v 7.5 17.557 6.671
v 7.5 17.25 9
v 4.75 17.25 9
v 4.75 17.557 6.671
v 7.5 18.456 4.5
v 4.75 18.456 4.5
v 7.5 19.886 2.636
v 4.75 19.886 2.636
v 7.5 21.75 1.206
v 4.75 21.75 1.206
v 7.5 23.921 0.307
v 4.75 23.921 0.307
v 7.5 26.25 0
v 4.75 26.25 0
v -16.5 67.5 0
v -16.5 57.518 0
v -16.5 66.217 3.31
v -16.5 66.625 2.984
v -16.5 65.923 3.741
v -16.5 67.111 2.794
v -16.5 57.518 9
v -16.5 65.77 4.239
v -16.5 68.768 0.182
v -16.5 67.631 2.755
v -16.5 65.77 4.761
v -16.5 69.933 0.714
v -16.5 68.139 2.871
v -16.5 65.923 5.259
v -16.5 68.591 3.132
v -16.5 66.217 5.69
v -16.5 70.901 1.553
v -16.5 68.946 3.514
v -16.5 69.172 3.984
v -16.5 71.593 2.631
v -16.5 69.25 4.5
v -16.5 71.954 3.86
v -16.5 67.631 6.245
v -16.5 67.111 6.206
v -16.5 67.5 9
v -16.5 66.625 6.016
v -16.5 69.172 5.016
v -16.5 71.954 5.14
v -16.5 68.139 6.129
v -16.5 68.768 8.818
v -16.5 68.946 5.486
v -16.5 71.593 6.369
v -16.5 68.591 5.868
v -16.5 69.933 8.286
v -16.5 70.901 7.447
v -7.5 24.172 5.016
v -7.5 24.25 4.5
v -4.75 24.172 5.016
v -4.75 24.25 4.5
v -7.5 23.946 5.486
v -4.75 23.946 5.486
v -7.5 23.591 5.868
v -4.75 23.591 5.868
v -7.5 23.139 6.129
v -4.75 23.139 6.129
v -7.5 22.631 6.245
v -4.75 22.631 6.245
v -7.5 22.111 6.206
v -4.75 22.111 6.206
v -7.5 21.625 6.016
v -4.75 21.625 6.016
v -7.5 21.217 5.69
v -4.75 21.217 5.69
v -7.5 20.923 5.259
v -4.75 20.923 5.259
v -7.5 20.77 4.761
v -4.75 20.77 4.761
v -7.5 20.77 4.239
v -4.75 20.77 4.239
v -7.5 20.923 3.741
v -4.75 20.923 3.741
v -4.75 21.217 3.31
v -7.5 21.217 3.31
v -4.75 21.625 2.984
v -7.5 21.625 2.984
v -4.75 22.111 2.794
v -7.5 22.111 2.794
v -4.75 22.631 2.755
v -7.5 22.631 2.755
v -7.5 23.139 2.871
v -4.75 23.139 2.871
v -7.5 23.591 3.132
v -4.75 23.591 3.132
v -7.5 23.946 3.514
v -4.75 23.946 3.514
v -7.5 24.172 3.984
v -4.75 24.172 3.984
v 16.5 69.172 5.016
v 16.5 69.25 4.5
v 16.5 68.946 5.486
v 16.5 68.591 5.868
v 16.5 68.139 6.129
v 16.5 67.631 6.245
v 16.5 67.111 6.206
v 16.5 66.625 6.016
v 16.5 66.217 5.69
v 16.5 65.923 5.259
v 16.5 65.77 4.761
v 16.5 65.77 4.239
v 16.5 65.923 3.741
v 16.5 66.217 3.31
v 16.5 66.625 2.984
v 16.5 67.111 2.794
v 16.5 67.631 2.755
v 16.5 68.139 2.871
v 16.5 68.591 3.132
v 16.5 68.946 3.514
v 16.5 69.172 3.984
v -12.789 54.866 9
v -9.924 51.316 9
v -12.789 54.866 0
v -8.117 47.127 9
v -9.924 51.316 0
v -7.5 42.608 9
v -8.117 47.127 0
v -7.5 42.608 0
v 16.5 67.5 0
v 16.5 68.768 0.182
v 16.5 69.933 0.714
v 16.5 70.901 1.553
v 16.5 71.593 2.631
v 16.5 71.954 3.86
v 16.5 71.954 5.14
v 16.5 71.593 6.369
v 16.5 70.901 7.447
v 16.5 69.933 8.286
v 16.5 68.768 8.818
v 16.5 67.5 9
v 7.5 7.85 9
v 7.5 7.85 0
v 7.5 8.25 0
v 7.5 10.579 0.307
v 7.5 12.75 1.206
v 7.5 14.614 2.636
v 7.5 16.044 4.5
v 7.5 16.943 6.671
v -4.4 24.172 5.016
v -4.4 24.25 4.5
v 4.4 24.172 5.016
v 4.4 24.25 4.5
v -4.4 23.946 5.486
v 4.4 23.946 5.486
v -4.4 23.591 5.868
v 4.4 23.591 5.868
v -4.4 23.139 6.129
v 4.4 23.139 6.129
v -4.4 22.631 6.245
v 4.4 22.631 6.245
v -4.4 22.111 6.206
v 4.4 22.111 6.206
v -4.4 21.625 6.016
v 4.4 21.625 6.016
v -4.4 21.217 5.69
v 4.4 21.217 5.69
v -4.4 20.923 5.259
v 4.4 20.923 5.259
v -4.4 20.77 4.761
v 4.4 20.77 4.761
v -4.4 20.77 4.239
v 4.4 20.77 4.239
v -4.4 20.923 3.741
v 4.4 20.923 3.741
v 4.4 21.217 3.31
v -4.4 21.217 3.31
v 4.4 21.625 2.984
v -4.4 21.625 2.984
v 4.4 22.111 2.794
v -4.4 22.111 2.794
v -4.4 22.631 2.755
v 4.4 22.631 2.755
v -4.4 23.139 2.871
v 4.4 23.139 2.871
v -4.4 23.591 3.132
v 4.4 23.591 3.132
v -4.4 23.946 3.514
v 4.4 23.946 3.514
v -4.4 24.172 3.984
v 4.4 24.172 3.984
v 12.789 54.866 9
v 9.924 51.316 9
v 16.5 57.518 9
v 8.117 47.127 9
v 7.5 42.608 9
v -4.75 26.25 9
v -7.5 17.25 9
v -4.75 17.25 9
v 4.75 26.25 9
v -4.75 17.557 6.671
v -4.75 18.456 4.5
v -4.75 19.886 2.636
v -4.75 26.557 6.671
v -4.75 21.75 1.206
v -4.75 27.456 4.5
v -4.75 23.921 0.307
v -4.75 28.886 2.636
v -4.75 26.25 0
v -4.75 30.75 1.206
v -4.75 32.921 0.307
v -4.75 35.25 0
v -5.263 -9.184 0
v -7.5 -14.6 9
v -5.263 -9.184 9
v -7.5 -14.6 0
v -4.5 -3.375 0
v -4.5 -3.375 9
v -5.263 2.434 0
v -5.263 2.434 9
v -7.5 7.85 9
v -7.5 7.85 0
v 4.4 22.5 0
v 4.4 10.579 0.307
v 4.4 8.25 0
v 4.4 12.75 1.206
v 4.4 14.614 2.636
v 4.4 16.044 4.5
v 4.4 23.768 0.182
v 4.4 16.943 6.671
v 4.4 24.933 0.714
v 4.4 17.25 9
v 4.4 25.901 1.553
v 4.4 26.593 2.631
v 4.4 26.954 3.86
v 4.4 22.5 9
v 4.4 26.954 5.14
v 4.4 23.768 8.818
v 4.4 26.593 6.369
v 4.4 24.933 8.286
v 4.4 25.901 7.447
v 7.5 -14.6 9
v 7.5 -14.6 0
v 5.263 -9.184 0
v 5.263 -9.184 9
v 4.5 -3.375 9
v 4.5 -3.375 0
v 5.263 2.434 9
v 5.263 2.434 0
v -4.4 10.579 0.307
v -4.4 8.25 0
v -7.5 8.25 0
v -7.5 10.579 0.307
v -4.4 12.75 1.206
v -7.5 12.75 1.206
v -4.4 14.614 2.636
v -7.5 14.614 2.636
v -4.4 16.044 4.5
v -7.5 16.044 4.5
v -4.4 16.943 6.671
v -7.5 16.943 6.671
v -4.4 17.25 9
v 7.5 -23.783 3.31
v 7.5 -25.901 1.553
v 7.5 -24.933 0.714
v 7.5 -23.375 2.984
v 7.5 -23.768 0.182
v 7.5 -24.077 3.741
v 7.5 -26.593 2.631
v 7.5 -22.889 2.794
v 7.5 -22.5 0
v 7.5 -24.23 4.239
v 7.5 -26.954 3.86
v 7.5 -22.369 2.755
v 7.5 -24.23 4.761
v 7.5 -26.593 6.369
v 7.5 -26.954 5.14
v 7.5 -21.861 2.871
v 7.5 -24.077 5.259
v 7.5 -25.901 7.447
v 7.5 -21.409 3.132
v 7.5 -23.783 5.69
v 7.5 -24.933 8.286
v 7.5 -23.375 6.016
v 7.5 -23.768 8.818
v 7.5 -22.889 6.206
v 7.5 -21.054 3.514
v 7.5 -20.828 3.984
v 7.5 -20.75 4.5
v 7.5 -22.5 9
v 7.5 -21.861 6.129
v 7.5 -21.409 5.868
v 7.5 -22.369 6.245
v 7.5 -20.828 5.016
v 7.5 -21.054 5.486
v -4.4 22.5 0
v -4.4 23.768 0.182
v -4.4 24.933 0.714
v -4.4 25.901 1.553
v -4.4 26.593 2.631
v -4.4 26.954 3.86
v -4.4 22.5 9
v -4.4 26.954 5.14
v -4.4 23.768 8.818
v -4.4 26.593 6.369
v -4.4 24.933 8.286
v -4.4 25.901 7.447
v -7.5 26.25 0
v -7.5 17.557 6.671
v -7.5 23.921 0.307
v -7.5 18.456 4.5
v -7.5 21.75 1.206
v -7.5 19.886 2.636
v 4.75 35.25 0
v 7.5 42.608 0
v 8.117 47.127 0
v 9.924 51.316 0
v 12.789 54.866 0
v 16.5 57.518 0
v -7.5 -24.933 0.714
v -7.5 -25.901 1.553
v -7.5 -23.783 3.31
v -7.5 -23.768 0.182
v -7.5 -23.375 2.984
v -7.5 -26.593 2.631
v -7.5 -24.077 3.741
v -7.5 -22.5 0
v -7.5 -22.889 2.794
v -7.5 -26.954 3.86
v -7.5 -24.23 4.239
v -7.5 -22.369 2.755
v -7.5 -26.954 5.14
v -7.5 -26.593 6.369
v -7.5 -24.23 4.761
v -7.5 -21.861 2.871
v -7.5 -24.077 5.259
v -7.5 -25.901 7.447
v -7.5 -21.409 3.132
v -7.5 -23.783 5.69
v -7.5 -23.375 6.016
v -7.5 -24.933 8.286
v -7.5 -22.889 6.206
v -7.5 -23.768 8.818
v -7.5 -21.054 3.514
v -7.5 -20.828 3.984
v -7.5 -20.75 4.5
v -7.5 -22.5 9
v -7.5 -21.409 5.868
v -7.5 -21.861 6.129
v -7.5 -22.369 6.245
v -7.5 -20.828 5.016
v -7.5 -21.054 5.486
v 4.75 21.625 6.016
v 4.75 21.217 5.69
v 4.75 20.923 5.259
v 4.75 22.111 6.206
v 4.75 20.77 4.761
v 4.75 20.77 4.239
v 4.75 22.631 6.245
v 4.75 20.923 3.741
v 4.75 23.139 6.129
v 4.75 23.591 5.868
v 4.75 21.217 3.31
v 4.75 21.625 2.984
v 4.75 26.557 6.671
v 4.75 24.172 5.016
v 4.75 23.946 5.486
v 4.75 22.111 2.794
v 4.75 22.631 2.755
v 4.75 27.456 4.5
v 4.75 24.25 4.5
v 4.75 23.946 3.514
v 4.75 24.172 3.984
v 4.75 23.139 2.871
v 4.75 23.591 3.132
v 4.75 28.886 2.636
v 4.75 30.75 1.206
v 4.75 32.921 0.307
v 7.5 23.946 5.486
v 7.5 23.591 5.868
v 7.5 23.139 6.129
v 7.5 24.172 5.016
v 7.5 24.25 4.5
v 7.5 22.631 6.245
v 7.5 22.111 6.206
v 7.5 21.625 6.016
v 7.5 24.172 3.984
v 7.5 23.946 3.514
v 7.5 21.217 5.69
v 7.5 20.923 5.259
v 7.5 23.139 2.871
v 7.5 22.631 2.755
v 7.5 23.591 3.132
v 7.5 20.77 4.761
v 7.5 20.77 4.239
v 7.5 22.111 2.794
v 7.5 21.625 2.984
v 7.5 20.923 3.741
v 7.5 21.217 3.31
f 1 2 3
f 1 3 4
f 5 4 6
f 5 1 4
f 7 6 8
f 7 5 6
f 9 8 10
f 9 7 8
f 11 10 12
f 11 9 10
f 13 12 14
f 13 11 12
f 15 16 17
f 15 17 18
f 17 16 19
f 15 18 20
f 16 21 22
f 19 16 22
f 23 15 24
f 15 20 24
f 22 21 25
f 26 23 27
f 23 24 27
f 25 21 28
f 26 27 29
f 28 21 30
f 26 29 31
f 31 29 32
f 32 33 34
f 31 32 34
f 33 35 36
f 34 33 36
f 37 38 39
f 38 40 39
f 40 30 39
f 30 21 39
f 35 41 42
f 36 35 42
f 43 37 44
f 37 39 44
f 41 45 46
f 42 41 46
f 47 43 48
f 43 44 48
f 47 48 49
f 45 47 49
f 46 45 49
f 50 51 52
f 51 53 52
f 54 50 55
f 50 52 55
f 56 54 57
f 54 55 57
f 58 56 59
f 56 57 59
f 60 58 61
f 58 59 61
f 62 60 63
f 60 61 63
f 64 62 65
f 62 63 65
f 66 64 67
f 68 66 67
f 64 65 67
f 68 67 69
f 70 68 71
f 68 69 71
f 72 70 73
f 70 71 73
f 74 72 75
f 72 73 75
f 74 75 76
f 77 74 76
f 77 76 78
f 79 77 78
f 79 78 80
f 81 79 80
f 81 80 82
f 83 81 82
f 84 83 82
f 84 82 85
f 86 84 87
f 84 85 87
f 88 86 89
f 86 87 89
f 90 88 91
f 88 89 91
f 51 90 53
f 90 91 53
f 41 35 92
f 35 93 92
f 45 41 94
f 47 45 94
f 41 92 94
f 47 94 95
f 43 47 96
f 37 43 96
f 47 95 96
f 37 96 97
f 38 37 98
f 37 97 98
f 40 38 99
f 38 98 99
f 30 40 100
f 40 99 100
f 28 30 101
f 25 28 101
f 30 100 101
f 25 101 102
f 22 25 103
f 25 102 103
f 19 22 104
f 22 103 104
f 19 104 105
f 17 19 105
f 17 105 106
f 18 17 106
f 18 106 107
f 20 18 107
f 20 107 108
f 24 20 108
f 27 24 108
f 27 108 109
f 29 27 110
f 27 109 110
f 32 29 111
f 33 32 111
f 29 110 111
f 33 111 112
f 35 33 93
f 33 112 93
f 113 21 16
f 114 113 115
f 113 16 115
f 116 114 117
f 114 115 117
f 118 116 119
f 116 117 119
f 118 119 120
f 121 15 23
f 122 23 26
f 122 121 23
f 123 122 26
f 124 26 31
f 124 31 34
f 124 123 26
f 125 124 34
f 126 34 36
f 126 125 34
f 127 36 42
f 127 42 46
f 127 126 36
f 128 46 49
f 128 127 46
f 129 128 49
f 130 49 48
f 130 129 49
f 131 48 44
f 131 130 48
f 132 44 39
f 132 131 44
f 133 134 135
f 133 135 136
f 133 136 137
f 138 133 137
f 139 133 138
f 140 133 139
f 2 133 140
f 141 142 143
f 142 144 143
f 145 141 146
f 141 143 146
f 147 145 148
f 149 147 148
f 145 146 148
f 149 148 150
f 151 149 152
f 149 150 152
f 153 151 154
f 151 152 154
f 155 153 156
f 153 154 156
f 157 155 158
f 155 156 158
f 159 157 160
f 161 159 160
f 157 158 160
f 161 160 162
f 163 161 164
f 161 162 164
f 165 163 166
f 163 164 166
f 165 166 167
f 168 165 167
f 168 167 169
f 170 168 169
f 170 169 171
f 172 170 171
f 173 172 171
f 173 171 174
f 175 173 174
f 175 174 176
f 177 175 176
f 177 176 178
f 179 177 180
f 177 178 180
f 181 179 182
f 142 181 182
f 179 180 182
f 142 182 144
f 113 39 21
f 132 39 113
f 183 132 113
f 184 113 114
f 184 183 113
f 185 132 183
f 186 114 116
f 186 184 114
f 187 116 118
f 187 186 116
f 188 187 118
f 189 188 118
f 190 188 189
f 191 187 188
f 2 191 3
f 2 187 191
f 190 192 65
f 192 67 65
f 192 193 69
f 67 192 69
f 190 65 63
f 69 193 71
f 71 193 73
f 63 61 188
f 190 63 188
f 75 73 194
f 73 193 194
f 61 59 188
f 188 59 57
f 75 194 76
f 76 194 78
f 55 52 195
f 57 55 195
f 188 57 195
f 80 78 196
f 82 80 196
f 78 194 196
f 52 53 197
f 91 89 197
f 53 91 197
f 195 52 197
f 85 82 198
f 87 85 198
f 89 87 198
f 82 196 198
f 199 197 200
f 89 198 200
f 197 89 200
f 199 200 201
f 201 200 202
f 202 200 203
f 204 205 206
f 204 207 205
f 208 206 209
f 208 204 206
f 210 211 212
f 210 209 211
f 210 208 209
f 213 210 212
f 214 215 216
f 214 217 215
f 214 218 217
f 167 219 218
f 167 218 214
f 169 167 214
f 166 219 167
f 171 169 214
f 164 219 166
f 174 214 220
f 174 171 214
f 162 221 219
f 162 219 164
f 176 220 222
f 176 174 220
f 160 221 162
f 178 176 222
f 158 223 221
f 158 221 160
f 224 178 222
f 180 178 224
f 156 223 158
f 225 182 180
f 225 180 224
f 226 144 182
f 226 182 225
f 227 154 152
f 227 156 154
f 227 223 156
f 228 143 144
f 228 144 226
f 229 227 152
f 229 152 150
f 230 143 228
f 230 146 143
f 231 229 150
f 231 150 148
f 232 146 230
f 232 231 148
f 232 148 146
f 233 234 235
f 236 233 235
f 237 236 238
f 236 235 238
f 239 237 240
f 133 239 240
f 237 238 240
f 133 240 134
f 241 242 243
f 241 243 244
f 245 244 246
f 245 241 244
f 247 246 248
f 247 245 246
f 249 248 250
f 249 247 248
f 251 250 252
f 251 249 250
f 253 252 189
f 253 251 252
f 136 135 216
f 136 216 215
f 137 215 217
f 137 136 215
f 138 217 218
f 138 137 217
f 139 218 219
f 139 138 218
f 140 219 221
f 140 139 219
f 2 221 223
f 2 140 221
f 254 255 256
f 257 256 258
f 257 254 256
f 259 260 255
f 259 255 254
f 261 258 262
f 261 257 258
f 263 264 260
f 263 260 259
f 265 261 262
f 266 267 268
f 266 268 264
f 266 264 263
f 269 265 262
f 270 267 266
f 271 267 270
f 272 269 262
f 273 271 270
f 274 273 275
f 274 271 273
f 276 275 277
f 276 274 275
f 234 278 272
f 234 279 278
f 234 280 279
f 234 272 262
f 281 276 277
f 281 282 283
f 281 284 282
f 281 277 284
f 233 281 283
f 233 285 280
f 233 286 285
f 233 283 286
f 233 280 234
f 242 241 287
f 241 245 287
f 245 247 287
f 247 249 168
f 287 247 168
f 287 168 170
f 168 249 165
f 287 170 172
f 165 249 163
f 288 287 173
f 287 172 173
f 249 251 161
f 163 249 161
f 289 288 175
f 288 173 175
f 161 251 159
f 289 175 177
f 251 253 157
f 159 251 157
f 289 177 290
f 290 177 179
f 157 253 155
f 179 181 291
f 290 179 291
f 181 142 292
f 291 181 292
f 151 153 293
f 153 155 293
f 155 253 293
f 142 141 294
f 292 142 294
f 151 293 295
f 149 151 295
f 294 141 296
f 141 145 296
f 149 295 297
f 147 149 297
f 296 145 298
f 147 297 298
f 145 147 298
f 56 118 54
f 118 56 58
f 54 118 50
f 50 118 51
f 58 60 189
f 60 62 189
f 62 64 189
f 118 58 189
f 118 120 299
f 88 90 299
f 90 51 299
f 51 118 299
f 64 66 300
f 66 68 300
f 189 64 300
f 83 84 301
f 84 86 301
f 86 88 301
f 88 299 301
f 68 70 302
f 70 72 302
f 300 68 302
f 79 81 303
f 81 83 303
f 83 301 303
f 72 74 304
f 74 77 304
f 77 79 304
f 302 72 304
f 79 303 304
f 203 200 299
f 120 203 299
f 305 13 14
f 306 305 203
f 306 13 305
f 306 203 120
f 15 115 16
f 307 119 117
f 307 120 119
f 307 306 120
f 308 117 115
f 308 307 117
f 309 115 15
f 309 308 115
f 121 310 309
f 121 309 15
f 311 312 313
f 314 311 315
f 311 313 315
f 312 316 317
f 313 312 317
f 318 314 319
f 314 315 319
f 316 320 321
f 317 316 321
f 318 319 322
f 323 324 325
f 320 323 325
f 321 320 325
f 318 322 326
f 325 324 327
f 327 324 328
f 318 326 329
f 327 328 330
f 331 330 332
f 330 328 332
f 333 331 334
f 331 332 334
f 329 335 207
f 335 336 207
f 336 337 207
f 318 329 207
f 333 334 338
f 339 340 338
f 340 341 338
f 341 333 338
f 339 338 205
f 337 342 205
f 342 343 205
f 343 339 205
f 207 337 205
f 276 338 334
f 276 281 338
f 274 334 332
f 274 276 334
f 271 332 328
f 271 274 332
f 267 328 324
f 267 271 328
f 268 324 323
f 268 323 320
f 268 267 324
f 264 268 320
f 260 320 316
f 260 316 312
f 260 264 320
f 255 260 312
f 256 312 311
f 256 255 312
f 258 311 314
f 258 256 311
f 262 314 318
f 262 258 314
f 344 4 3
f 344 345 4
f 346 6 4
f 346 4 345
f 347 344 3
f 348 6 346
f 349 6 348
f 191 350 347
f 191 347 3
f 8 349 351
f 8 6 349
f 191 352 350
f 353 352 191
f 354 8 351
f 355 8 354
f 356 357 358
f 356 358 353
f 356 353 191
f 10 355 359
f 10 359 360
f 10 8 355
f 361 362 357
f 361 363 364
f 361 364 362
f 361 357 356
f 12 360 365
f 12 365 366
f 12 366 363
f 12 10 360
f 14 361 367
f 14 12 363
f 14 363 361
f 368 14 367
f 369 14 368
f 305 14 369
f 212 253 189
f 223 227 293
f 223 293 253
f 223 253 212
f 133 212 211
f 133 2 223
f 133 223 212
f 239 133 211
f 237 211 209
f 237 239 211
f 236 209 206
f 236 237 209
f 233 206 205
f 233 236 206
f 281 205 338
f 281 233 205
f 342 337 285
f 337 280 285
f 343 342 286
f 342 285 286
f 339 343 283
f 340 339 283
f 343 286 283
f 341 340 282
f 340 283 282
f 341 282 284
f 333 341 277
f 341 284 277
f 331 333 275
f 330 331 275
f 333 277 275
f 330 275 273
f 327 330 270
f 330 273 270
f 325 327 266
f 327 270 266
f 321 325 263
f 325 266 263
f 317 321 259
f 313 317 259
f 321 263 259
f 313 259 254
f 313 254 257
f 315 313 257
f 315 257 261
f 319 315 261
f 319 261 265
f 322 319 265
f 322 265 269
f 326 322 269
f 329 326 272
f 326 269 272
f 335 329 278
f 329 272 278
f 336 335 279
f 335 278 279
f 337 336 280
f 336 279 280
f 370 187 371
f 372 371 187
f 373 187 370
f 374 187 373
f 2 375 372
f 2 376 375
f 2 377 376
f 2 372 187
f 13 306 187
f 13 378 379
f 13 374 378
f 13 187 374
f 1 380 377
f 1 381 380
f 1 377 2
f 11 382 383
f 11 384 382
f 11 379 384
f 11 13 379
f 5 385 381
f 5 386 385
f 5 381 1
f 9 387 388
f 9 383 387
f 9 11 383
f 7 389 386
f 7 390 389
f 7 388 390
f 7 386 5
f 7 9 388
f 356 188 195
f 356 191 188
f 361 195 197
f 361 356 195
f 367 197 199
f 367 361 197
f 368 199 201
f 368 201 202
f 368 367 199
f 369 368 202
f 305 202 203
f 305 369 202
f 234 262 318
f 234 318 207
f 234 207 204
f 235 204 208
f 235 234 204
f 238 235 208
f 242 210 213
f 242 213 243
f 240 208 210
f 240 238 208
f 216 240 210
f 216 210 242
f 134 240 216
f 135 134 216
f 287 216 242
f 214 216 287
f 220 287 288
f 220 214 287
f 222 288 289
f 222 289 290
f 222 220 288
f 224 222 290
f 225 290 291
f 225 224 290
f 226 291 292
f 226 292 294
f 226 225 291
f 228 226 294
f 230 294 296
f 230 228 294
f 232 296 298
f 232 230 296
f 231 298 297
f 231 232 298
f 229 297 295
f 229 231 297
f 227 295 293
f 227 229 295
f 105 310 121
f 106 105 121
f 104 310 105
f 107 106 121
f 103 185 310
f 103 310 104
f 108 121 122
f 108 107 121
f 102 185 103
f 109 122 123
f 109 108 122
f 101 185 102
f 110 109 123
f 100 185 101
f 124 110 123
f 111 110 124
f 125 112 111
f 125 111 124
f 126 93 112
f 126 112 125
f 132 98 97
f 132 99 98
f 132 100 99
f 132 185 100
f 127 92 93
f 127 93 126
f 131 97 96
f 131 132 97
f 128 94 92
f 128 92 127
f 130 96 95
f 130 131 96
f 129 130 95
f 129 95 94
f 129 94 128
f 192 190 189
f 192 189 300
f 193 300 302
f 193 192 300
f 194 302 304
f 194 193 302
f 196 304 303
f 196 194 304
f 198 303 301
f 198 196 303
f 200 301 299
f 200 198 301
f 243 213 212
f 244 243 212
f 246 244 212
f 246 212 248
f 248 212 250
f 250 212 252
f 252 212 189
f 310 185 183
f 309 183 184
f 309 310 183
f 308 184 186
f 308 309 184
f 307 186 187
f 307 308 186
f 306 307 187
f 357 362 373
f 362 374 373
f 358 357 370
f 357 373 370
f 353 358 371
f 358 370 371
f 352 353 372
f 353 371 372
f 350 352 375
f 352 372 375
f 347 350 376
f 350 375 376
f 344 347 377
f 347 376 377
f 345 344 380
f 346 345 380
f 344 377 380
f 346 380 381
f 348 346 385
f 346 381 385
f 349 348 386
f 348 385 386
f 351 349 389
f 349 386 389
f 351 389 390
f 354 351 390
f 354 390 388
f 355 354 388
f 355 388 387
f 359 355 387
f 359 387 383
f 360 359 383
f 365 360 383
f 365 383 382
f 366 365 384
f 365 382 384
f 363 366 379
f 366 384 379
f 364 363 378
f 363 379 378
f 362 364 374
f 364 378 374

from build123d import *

# Parameters (mm, degrees)
F1_DEPTH  = 7.5
F3_DEPTH  = 4.4
F4_R      = 22.5
F5_DEPTH  = 25
F9_DEPTH  = 16.5
F11_DEPTH = 25
F13_W     = 9.5
F13_H     = 11.25
F14_DEPTH = 25
F16_R     = 8.99999
F17_R     = 1.75
F18_DEPTH = 40


# Not quite as in the source:
# - a fillet or chamfer is up to 0.001 mm smaller than in the source, because OpenCascade refuses the exact size


with BuildPart() as f1:
    # F0 (on Right) → F1 (new body, symmetric)
    with BuildSketch(Plane.YZ):
        with BuildLine():
            ThreePointArc((-22.5, 9), (-27, 4.5), (-22.5, 0))
            Line((-22.5, 0), (8.25, 0))
            ThreePointArc((8.25, 0), (14.6139610307, 2.6360389693), (17.25, 9))
            Line((17.25, 9), (-22.5, 9))
        make_face()
    extrude(amount=F1_DEPTH, both=True)

    # F2 (on Right) → F3 (join, symmetric)
    with BuildSketch(Plane.YZ):
        with BuildLine():
            Line((22.5, 9), (0, 9))
            Line((0, 9), (0, 0))
            Line((0, 0), (22.5, 0))
            ThreePointArc((22.5, 0), (27, 4.5), (22.5, 9))
        make_face()
    extrude(amount=F3_DEPTH, both=True)


with BuildPart() as f5:
    # F4 (on Top) → F5 (new body)
    with BuildSketch(Plane.XY):
        with Locations((-27, -3.375)):
            Circle(F4_R)
    extrude(amount=F5_DEPTH)


with BuildPart() as f6_1:
    # F6: instance of F5
    add(f5.part.mirror(Plane.YZ))


with BuildPart() as f1_1:
    add(f1.part)

    # F7: cut F6_1, F5
    add(f6_1.part, mode=Mode.SUBTRACT)
    add(f5.part, mode=Mode.SUBTRACT)


with BuildPart() as f9:
    # F8 (on Right) → F9 (new body, symmetric)
    with BuildSketch(Plane.YZ):
        with BuildLine():
            Line((67.5, 9), (17.25, 9))
            ThreePointArc((17.25, 9), (19.8860389693, 2.6360389693), (26.25, 0))
            Line((26.25, 0), (67.5, 0))
            ThreePointArc((67.5, 0), (72, 4.5), (67.5, 9))
        make_face()
    extrude(amount=F9_DEPTH, both=True)


with BuildPart() as f11:
    # F10 (on Top) → F11 (new body)
    with BuildSketch(Plane.XY):
        with BuildLine():
            Line((7.5, 42.6077849247), (7.5, 16.5))
            Line((7.5, 16.5), (18.75, 16.5))
            Line((18.75, 16.5), (18.75, 58.5))
            ThreePointArc((18.75, 58.5), (10.5971366618, 52.343351164), (7.5, 42.6077849247))
        make_face()
    extrude(amount=F11_DEPTH)


with BuildPart() as f12_1:
    # F12: instance of F11
    add(f11.part.mirror(Plane.YZ))


with BuildPart() as f14:
    # F13 (on Top) → F14 (new body)
    with BuildSketch(Plane.XY):
        with Locations((0, 20.625)):
            Rectangle(F13_W, F13_H)
    extrude(amount=F14_DEPTH)


with BuildPart() as f9_1:
    add(f9.part)

    # F15: cut F12_1, F11, F14
    add(f12_1.part, mode=Mode.SUBTRACT)
    add(f11.part, mode=Mode.SUBTRACT)
    add(f14.part, mode=Mode.SUBTRACT)

    # F16 (radius 9 in the source; OpenCascade refuses exactly that, so slightly less here)
    f16_edges = [f9_1.edges().sort_by_distance(p)[0] for p in [
        (6.125, 26.25, 0),
        (0, 26.25, 0),
        (-6.125, 26.25, 0),
    ]]
    fillet(f16_edges, radius=F16_R)


with BuildPart() as f18:
    # F17 (on face) → F18 (new body, symmetric)
    with BuildSketch(Plane.YZ.offset(7.5)):
        with Locations((-22.5, 4.5)):
            Circle(F17_R)
    extrude(amount=F18_DEPTH, both=True)


with BuildPart() as f18b:
    # F17 (on face) → F18, piece 2 (new body, symmetric)
    with BuildSketch(Plane.YZ.offset(7.5)):
        with Locations((22.5, 4.5)):
            Circle(F17_R)
    extrude(amount=F18_DEPTH, both=True)


with BuildPart() as f18c:
    # F17 (on face) → F18, piece 3 (new body, symmetric)
    with BuildSketch(Plane.YZ.offset(7.5)):
        with Locations((67.5, 4.5)):
            Circle(F17_R)
    extrude(amount=F18_DEPTH, both=True)


with BuildPart() as f1_2:
    add(f1_1.part)

    # F19: cut F18b, F18, F18c
    add(f18b.part, mode=Mode.SUBTRACT)
    add(f18.part, mode=Mode.SUBTRACT)
    add(f18c.part, mode=Mode.SUBTRACT)


with BuildPart() as f9_2:
    add(f9_1.part)

    # F19: cut F18b, F18, F18c
    add(f18b.part, mode=Mode.SUBTRACT)
    add(f18.part, mode=Mode.SUBTRACT)
    add(f18c.part, mode=Mode.SUBTRACT)


solid = Compound([f1_2.part, f9_2.part])
